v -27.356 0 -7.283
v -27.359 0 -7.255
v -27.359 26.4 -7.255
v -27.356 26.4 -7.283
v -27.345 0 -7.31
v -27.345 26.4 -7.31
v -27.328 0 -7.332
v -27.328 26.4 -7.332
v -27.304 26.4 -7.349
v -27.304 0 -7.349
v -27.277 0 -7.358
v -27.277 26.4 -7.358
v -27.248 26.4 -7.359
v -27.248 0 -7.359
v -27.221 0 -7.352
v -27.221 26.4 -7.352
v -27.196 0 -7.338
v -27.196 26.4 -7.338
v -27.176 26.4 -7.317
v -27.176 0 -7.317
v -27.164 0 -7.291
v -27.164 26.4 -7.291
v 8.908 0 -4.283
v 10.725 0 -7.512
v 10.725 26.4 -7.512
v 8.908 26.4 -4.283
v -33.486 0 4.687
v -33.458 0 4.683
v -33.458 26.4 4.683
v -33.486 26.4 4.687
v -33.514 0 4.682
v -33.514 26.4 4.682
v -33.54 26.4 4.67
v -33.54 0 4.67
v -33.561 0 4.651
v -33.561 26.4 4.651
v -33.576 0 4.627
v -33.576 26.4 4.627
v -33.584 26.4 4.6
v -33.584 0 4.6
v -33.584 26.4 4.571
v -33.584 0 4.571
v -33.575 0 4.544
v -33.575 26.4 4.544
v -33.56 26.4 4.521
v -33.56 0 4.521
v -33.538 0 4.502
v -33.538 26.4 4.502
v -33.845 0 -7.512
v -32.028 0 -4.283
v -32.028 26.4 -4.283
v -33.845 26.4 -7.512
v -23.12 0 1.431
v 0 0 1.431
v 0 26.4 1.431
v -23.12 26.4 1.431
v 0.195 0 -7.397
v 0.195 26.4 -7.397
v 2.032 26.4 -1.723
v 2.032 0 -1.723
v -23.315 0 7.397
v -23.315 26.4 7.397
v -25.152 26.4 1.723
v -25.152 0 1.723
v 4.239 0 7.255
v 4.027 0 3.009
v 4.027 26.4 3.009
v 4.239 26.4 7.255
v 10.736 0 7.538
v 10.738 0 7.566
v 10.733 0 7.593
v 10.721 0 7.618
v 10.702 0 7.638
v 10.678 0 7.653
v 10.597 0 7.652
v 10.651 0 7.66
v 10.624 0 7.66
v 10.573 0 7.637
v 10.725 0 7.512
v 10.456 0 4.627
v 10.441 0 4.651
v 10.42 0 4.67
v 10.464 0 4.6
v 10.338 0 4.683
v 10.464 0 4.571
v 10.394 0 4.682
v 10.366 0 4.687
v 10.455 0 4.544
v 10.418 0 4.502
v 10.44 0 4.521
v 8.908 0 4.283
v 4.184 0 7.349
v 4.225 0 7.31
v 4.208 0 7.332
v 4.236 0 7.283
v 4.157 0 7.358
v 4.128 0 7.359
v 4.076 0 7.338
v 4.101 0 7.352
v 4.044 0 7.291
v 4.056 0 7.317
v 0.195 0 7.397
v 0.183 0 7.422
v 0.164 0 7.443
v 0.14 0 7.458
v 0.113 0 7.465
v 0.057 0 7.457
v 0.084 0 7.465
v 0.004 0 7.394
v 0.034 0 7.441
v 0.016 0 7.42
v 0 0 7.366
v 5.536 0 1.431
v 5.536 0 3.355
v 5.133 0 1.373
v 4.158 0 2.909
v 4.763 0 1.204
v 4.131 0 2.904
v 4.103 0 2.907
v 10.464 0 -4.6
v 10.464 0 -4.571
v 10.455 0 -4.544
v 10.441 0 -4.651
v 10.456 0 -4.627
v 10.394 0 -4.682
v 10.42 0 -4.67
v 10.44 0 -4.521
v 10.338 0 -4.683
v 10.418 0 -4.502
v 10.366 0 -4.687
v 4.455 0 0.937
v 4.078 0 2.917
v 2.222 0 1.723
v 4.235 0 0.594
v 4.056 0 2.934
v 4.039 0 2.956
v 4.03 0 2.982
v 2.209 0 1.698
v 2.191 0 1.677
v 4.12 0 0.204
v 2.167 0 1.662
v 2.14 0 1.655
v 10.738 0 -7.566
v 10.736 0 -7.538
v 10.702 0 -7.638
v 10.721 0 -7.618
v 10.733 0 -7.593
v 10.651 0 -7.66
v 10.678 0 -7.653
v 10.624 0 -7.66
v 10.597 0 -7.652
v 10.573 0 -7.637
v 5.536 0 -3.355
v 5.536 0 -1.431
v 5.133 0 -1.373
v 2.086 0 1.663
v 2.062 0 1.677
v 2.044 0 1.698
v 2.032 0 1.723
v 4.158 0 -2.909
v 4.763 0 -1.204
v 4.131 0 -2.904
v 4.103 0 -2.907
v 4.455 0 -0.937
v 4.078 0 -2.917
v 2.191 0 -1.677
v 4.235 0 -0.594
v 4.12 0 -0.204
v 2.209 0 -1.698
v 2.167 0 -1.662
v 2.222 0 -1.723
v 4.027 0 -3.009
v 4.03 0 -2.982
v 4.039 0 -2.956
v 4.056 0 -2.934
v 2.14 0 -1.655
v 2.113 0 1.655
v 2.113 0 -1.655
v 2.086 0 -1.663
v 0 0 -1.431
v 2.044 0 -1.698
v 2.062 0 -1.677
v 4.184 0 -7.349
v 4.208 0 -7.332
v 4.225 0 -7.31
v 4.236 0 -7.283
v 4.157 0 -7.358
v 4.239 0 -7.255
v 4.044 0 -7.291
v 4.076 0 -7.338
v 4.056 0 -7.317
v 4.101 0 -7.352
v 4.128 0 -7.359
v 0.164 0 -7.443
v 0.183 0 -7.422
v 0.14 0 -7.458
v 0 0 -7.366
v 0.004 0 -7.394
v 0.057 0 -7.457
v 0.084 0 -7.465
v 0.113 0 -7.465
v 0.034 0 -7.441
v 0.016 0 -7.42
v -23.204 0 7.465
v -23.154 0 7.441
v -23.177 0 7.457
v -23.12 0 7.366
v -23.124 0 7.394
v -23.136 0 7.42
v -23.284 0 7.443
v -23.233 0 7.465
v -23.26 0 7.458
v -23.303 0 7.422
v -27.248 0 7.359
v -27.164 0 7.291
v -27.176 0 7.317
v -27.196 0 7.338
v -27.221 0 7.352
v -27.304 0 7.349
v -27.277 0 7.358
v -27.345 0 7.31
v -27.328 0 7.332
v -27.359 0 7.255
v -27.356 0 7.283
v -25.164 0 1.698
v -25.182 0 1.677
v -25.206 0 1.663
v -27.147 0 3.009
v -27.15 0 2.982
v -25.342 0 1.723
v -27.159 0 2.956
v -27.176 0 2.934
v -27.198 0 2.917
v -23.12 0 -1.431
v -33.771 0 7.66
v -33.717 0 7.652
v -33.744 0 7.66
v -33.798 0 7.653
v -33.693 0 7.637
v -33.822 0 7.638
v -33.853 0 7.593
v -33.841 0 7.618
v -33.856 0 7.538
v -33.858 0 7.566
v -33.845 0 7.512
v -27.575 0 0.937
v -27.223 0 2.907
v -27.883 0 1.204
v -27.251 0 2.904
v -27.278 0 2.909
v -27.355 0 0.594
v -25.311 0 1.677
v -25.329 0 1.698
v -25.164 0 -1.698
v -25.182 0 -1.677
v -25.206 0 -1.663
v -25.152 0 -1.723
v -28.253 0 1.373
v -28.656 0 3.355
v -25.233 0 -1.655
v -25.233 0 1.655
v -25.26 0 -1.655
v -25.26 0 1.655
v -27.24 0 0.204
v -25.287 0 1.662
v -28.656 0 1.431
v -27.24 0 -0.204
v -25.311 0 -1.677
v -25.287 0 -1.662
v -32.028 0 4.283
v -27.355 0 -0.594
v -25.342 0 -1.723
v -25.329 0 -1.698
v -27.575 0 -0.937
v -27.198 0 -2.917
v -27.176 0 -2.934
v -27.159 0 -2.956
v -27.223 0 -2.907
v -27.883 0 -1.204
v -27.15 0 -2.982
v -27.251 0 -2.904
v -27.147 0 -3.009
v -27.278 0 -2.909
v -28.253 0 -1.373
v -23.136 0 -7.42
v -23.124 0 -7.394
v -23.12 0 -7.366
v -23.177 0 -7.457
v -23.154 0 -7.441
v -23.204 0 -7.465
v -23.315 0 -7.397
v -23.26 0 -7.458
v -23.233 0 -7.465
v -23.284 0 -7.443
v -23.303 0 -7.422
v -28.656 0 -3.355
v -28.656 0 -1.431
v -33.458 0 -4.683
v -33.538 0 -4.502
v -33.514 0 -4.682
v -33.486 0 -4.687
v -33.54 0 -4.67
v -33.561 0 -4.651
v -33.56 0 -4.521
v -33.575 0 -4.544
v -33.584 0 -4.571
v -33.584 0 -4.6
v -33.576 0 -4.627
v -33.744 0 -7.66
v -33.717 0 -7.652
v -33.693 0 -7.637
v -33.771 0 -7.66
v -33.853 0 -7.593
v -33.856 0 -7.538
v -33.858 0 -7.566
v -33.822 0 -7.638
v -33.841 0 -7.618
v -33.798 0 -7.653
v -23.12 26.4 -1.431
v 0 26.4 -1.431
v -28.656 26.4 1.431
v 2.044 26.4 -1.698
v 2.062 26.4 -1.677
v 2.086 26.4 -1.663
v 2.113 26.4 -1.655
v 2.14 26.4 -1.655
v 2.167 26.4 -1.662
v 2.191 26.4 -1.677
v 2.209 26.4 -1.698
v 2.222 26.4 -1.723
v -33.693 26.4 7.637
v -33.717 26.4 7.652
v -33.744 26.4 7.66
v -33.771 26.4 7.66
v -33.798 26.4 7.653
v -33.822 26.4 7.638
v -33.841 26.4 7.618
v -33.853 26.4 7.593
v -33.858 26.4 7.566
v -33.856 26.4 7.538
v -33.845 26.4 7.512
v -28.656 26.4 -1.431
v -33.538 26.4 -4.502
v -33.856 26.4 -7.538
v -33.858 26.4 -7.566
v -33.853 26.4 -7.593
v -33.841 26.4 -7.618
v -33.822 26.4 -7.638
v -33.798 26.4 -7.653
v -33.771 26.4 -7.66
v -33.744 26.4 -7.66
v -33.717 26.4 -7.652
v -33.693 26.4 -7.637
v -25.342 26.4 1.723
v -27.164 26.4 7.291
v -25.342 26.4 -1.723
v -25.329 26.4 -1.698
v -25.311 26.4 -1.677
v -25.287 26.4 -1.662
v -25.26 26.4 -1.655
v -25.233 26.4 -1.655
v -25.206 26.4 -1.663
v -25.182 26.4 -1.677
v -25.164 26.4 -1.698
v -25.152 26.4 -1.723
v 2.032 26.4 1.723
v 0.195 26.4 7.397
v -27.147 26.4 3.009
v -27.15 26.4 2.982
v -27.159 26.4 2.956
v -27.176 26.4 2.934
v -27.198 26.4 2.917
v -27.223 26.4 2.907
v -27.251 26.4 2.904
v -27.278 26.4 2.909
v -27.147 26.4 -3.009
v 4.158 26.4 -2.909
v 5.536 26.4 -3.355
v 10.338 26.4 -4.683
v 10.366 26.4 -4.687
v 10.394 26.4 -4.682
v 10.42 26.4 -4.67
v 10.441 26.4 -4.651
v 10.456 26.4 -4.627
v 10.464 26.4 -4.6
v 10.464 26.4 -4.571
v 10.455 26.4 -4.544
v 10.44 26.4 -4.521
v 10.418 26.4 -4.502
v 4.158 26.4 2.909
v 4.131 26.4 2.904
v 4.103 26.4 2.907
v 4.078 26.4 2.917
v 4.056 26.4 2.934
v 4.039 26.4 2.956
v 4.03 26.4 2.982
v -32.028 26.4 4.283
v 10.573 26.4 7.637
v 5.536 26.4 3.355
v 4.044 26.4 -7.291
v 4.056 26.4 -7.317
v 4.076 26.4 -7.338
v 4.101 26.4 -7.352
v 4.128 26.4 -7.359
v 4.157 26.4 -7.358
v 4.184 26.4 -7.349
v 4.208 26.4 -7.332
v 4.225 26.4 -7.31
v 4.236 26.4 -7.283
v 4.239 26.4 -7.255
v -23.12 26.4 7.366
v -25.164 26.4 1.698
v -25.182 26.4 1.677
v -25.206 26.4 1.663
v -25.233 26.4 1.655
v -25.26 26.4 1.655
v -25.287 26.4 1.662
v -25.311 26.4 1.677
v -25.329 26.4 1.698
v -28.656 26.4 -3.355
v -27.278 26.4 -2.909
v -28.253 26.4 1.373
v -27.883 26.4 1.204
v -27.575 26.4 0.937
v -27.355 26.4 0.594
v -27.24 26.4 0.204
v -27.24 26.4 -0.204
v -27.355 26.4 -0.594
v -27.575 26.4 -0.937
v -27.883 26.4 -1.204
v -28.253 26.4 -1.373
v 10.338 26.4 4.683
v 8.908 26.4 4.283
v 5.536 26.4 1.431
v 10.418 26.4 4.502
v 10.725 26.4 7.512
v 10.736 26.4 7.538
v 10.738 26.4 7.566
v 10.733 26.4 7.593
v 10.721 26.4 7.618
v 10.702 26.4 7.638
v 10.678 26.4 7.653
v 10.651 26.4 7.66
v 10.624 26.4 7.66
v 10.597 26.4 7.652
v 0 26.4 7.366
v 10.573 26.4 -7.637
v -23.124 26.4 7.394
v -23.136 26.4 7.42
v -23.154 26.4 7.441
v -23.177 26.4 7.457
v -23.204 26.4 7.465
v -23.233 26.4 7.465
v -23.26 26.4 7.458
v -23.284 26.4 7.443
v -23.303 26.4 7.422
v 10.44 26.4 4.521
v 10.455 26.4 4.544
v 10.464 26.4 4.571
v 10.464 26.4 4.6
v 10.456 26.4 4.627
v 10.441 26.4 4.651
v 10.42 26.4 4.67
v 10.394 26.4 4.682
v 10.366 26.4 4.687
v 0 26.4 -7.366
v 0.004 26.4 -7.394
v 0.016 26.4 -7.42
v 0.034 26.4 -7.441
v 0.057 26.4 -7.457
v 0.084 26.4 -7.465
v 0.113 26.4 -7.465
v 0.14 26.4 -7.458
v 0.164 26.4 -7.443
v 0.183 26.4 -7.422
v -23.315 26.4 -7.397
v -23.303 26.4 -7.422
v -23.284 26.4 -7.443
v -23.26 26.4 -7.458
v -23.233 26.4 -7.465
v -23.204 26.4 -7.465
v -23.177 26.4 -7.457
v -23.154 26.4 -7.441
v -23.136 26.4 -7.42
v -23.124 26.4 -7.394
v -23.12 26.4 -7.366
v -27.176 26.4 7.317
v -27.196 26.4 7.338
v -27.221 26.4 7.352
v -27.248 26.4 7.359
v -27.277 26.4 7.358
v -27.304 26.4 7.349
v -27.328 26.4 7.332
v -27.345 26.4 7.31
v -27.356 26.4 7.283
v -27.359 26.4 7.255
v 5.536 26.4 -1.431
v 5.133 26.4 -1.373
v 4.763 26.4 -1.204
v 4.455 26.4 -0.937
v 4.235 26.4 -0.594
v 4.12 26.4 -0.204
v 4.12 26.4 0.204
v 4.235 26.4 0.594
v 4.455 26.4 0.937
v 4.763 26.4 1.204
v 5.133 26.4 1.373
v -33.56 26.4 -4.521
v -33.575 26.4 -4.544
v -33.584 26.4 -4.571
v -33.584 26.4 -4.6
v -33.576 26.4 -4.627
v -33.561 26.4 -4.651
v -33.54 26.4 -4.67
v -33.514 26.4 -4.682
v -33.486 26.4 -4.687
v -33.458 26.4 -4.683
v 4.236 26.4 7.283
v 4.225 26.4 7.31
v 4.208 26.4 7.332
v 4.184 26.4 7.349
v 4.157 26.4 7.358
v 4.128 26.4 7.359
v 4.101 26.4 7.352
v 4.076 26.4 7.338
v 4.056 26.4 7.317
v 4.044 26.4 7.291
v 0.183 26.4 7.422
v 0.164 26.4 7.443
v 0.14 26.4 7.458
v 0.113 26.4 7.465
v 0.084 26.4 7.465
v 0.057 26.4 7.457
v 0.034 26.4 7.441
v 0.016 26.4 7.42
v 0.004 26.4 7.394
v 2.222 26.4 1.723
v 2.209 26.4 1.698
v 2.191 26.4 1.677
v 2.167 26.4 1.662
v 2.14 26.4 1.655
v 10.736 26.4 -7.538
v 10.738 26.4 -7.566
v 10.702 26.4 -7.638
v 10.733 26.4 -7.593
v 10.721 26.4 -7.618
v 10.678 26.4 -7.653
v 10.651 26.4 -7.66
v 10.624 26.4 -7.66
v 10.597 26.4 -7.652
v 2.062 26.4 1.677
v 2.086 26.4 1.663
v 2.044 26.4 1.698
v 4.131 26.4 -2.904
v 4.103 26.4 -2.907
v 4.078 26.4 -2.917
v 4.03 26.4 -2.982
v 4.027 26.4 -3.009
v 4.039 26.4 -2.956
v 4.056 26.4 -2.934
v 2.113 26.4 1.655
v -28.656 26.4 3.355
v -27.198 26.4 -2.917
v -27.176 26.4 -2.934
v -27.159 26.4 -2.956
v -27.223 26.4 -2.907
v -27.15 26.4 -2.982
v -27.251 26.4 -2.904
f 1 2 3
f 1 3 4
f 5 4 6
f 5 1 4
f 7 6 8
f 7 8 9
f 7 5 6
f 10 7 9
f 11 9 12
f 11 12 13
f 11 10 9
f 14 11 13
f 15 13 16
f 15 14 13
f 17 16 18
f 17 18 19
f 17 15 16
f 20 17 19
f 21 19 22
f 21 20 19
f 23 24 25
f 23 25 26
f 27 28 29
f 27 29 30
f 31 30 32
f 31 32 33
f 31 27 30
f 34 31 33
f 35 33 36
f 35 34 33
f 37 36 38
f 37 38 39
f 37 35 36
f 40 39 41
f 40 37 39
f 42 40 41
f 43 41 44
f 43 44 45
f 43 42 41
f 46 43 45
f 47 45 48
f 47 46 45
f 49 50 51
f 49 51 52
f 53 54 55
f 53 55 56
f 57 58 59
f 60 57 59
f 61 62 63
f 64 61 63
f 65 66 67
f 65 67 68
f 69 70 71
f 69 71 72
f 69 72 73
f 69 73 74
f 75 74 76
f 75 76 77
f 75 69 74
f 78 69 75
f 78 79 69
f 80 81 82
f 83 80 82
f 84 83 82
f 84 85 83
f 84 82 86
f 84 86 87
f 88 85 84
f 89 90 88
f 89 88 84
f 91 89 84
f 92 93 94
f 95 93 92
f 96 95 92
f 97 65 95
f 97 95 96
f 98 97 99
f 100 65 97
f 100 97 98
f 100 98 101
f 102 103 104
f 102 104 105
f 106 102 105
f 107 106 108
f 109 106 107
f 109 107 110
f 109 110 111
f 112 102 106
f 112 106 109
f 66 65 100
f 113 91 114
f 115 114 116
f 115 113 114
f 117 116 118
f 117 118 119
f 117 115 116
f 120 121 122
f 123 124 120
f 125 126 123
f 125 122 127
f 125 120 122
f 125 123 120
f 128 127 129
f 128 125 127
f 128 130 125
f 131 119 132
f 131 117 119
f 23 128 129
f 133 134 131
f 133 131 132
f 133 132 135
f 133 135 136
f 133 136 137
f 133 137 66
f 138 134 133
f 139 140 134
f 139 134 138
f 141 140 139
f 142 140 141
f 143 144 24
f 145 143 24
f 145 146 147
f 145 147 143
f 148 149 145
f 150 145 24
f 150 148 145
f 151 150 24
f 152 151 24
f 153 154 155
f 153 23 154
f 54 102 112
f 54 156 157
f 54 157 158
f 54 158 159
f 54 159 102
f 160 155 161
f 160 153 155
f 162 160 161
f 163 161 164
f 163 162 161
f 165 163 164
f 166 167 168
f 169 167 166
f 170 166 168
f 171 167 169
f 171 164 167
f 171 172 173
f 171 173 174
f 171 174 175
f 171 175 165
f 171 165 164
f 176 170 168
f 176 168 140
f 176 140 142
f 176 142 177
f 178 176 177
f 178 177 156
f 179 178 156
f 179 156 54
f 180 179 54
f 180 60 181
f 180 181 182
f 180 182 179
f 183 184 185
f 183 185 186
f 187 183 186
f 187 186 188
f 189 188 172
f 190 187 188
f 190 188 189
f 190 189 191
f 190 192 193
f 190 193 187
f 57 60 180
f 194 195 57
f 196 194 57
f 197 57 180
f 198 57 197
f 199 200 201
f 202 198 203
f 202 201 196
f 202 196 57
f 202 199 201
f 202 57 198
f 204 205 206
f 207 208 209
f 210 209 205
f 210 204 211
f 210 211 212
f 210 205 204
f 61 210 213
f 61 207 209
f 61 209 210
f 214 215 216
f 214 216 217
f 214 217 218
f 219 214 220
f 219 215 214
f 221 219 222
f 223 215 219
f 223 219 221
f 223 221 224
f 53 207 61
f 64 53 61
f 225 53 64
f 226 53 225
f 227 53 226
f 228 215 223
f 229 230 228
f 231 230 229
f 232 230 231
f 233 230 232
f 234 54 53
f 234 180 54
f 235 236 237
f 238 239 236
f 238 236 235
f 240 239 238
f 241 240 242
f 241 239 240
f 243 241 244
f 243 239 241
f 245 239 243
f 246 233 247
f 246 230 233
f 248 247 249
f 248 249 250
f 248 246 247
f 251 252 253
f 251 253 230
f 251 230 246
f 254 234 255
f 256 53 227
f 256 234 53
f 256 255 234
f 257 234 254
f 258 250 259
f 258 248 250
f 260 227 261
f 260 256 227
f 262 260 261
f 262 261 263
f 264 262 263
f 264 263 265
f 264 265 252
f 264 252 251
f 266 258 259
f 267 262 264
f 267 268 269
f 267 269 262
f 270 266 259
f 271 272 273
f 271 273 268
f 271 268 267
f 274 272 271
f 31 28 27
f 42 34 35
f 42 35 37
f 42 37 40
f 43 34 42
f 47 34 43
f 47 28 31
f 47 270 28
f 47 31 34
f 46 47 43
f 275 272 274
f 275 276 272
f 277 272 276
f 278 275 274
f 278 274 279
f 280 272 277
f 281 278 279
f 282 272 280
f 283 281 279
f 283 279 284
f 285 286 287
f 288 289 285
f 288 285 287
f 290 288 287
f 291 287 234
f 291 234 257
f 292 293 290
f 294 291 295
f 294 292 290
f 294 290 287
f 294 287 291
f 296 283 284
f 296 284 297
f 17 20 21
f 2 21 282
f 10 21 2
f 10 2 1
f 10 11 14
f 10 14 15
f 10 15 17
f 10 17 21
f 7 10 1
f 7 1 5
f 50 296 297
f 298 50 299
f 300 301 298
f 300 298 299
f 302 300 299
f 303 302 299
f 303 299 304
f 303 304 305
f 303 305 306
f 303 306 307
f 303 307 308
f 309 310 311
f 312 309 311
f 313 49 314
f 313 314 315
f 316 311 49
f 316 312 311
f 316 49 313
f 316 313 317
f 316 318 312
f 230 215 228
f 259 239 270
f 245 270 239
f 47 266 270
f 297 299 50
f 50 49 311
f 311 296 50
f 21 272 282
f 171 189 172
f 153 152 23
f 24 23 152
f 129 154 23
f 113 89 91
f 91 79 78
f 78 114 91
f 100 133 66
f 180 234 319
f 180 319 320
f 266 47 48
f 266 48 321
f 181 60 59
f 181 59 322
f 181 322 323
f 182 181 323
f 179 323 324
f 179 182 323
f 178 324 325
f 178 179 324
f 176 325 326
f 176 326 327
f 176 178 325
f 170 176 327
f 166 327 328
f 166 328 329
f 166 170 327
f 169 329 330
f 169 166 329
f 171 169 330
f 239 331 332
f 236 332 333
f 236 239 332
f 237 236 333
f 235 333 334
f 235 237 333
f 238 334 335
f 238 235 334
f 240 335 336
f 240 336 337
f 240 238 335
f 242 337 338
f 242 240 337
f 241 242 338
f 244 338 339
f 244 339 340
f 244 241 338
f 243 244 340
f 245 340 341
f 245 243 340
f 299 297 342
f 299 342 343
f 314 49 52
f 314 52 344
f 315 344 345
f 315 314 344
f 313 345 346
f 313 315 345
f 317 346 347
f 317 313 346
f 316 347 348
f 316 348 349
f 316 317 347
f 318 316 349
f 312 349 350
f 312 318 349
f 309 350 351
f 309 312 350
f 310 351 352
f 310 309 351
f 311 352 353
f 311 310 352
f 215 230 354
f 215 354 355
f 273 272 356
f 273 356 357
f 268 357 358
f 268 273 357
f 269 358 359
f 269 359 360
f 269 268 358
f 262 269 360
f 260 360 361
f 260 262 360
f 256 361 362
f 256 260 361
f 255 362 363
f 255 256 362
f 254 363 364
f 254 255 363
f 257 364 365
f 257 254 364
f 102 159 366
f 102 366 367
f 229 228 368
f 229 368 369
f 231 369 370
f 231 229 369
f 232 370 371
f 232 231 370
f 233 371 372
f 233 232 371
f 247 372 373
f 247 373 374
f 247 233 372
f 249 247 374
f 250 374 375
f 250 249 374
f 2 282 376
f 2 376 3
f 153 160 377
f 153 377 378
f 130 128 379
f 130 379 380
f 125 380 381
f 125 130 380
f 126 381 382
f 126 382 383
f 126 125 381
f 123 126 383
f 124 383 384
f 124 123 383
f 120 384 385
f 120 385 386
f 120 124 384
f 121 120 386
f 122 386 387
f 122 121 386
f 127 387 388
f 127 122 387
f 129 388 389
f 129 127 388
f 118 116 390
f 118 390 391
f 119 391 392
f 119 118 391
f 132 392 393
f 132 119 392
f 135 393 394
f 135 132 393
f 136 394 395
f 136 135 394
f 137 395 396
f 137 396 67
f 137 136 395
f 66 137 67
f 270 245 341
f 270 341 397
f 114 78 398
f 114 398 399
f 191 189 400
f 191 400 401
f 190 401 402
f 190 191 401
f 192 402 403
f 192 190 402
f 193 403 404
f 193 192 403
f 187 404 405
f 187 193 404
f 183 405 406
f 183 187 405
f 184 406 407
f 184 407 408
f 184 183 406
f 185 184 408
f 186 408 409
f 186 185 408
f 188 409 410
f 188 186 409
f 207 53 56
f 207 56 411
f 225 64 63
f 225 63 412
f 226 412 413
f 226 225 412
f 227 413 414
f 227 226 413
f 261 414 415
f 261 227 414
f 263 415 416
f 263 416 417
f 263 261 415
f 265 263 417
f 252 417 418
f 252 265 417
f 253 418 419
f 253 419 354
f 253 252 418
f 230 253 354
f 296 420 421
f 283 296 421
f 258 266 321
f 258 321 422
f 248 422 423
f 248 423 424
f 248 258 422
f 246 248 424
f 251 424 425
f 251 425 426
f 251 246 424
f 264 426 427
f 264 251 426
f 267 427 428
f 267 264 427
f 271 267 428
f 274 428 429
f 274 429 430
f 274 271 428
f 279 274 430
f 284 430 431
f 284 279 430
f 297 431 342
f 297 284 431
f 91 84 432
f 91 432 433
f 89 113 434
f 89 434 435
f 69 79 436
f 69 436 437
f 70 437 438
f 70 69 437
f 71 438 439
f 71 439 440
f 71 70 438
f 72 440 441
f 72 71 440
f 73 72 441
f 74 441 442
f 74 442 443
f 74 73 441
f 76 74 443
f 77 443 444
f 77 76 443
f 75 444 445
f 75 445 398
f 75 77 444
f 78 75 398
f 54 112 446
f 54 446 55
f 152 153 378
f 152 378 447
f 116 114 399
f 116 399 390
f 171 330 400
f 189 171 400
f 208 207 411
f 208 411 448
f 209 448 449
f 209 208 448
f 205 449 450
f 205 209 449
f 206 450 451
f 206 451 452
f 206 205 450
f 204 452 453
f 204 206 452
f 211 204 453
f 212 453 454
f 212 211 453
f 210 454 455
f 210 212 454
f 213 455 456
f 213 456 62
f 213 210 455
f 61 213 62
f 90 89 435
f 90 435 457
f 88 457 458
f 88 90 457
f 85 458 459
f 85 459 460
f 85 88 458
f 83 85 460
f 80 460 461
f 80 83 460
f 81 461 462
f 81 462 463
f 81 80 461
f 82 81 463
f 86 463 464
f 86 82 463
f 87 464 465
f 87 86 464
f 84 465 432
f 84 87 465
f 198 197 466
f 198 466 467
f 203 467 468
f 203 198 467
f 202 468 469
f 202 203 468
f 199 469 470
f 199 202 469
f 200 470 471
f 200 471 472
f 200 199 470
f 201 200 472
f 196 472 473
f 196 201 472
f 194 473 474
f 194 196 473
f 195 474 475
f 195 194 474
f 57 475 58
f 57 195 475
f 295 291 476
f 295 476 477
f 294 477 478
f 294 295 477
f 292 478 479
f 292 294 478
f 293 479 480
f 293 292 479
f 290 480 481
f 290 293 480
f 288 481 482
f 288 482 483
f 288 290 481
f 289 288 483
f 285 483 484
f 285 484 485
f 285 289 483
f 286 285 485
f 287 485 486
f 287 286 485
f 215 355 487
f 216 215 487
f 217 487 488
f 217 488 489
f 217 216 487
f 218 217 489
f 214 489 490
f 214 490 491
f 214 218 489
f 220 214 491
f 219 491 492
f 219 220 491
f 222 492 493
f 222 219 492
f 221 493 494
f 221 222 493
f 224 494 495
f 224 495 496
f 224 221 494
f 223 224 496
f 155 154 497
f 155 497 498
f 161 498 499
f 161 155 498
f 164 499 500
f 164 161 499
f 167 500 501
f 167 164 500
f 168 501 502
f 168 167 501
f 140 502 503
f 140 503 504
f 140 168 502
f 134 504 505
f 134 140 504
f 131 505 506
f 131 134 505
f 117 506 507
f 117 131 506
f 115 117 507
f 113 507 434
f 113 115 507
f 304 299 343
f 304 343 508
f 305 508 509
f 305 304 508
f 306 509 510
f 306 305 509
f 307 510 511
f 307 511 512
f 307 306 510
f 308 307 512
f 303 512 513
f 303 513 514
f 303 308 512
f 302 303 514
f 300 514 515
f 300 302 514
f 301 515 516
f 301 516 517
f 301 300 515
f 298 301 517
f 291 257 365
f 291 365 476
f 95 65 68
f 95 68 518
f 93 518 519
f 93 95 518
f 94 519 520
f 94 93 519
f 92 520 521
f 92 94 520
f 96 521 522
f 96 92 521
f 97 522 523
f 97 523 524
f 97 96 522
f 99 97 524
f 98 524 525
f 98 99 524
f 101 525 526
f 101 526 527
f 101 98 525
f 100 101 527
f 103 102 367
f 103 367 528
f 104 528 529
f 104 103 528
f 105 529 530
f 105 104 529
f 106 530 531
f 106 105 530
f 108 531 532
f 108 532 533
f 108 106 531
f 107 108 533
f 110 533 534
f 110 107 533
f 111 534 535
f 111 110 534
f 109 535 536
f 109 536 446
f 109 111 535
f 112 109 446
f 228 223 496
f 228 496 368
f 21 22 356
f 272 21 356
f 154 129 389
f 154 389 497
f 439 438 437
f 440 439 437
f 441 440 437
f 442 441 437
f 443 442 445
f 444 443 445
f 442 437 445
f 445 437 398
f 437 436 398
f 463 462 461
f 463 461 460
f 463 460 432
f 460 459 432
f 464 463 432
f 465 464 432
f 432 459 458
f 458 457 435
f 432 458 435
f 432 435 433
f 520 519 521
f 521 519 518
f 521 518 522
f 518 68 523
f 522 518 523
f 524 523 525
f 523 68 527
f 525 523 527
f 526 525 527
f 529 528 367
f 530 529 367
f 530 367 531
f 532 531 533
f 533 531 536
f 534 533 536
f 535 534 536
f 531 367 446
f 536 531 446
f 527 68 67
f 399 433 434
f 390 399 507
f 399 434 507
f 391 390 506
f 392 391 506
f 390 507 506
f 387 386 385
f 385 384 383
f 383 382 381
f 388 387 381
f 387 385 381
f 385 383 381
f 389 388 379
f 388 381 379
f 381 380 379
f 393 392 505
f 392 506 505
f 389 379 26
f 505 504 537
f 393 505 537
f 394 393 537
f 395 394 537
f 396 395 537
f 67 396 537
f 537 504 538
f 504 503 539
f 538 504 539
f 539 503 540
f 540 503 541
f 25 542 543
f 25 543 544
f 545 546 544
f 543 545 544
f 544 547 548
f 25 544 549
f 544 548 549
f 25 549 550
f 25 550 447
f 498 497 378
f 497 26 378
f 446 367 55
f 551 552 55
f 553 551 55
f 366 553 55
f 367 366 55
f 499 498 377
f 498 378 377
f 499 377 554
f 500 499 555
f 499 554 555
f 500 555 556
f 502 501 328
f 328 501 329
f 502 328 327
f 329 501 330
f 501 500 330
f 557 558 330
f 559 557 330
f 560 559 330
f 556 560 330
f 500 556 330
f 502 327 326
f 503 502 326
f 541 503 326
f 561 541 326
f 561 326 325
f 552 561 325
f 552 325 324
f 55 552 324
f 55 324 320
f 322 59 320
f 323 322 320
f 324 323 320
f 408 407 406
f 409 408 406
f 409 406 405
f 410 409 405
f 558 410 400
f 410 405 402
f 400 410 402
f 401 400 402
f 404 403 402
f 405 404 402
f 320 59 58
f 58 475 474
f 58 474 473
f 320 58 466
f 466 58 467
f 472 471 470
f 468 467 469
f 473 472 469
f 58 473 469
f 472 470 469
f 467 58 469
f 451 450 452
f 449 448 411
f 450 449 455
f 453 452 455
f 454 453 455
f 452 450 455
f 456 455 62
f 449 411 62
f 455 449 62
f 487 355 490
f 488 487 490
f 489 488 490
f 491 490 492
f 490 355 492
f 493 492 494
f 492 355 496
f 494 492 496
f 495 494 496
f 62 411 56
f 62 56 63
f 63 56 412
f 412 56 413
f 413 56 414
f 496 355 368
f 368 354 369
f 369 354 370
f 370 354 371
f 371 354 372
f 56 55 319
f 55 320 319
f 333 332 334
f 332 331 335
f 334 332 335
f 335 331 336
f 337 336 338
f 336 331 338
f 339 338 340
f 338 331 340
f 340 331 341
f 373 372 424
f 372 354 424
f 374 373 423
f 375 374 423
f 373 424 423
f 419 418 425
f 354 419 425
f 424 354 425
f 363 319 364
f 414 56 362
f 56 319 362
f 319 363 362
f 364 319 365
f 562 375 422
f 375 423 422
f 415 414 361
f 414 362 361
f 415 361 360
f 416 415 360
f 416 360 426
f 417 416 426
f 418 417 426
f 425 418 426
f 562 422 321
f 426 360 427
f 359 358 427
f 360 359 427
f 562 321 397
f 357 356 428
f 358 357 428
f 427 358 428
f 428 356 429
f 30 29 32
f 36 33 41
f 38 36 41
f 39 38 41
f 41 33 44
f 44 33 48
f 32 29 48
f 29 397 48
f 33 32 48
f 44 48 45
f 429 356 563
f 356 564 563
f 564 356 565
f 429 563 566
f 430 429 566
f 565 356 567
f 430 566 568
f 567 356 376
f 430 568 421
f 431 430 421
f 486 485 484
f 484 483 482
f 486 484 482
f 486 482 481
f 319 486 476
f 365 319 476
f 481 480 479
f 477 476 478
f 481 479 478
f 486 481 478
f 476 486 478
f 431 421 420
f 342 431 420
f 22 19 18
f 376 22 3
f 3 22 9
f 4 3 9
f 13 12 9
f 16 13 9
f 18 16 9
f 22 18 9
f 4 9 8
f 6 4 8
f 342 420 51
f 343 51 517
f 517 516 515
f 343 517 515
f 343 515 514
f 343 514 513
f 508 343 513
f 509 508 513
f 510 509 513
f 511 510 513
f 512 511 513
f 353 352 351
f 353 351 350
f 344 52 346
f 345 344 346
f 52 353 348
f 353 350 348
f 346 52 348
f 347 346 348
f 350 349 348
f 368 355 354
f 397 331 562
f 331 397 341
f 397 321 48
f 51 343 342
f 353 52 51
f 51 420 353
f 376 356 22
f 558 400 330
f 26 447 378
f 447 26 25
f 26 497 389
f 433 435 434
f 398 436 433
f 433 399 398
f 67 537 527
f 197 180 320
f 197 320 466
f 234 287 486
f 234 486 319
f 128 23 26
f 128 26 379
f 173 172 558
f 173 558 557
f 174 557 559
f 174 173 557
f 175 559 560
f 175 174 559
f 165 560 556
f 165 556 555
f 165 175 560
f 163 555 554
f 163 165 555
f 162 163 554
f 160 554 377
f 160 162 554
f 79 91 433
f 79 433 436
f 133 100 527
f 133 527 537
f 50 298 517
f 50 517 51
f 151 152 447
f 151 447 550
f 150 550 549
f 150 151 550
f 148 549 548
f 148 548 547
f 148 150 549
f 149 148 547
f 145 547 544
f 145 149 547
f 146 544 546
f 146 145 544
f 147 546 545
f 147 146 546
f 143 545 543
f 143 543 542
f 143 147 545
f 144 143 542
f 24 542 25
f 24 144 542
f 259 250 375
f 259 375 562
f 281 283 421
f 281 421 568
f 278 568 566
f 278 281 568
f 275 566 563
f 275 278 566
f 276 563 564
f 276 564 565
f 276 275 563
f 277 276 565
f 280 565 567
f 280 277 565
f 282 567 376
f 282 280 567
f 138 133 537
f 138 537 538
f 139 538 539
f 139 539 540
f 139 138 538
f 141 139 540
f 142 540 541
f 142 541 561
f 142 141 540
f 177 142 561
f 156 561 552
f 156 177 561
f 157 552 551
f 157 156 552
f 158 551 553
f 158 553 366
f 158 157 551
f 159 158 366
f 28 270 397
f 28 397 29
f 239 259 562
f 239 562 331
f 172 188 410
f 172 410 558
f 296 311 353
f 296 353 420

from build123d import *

# Parameters (mm, degrees)
EXTRUDE_1_DEPTH = 26.4


with BuildPart() as part:
    # Эскиз1 → Бобышка-Вытянуть1 (new body)
    with BuildSketch(Plane(origin=(0, 0, 0), x_dir=(1, 0, 0), z_dir=(0, 1, 0))):
        with BuildLine():
            Line((0, -7.366273292), (0, -1.430737225))
            Line((0, -1.430737225), (-23.119998808, -1.430737225))
            Line((-23.119998808, -1.430737225), (-23.119998808, -7.366273292))
            ThreePointArc((-23.119998808, -7.366273292), (-23.204411997, -7.465051079), (-23.315139834, -7.397065907))
            Line((-23.315139834, -7.397065907), (-25.151536602, -1.723086212))
            ThreePointArc((-25.151536602, -1.723086212), (-25.246516215, -1.653878958), (-25.341718752, -1.722779233))
            Line((-25.341718752, -1.722779233), (-27.163713043, -7.290838427))
            ThreePointArc((-27.163713043, -7.290838427), (-27.276953731, -7.358068766), (-27.358630238, -7.254761845))
            Line((-27.358630238, -7.254761845), (-27.147073457, -3.009330281))
            ThreePointArc((-27.147073457, -3.009330281), (-27.186129834, -2.924974677), (-27.277742143, -2.909212268))
            Line((-27.277742143, -2.909212268), (-28.656433819, -3.355429045))
            Line((-28.656433819, -3.355429045), (-33.693480219, -7.637416988))
            ThreePointArc((-33.693480219, -7.637416988), (-33.821863766, -7.638385786), (-33.84539196, -7.51217288))
            Line((-33.84539196, -7.51217288), (-32.027666378, -4.283069467))
            Line((-32.027666378, -4.283069467), (-33.457933536, -4.683052776))
            ThreePointArc((-33.457933536, -4.683052776), (-33.57629105, -4.627262362), (-33.538118808, -4.502106653))
            Line((-33.538118808, -4.502106653), (-28.656434415, -1.430737225))
            ThreePointArc((-28.656434415, -1.430737225), (-27.22569719, 0), (-28.656434415, 1.430737225))
            Line((-28.656434415, 1.430737225), (-33.538118808, 4.502106653))
            ThreePointArc((-33.538118808, 4.502106653), (-33.57629105, 4.627262362), (-33.457933536, 4.683052776))
            Line((-33.457933536, 4.683052776), (-32.027666378, 4.283069467))
            Line((-32.027666378, 4.283069467), (-33.84539196, 7.51217288))
            ThreePointArc((-33.84539196, 7.51217288), (-33.821862569, 7.638384319), (-33.693480241, 7.637416132))
            Line((-33.693480241, 7.637416132), (-28.656433494, 3.355428597))
            Line((-28.656433494, 3.355428597), (-27.277741782, 2.909211931))
            ThreePointArc((-27.277741782, 2.909211931), (-27.186129475, 2.924974348), (-27.147073104, 3.009329955))
            Line((-27.147073104, 3.009329955), (-27.358630229, 7.254761502))
            ThreePointArc((-27.358630229, 7.254761502), (-27.27695373, 7.35806843), (-27.163713037, 7.2908381))
            Line((-27.163713037, 7.2908381), (-25.341718295, 1.722779053))
            ThreePointArc((-25.341718295, 1.722779053), (-25.246515752, 1.653878786), (-25.151536145, 1.723086048))
            Line((-25.151536145, 1.723086048), (-23.315139837, 7.397065891))
            ThreePointArc((-23.315139837, 7.397065891), (-23.204412005, 7.465051072), (-23.119998808, 7.366273292))
            Line((-23.119998808, 7.366273292), (-23.119998808, 1.430737225))
            Line((-23.119998808, 1.430737225), (0, 1.430737225))
            Line((0, 1.430737225), (0, 7.366273292))
            ThreePointArc((0, 7.366273292), (0.084413196, 7.465051072), (0.195141029, 7.397065891))
            Line((0.195141029, 7.397065891), (2.031537337, 1.723086048))
            ThreePointArc((2.031537337, 1.723086048), (2.126516944, 1.653878786), (2.221719487, 1.722779053))
            Line((2.221719487, 1.722779053), (4.043714229, 7.2908381))
            ThreePointArc((4.043714229, 7.2908381), (4.156954922, 7.35806843), (4.238631421, 7.254761502))
            Line((4.238631421, 7.254761502), (4.027074296, 3.009329955))
            ThreePointArc((4.027074296, 3.009329955), (4.066130667, 2.924974348), (4.157742974, 2.909211931))
            Line((4.157742974, 2.909211931), (5.536434686, 3.355428597))
            Line((5.536434686, 3.355428597), (10.573481433, 7.637416132))
            ThreePointArc((10.573481433, 7.637416132), (10.701863761, 7.638384319), (10.725393152, 7.51217288))
            Line((10.725393152, 7.51217288), (8.90766757, 4.283069467))
            Line((8.90766757, 4.283069467), (10.337934728, 4.683052776))
            ThreePointArc((10.337934728, 4.683052776), (10.456292242, 4.627262362), (10.41812, 4.502106653))
            Line((10.41812, 4.502106653), (5.536435606, 1.430737225))
            ThreePointArc((5.536435606, 1.430737225), (4.105698382, 0), (5.536435606, -1.430737225))
            Line((5.536435606, -1.430737225), (10.41812, -4.502106653))
            ThreePointArc((10.41812, -4.502106653), (10.456292242, -4.627262362), (10.337934728, -4.683052776))
            Line((10.337934728, -4.683052776), (8.90766757, -4.283069467))
            Line((8.90766757, -4.283069467), (10.725393152, -7.51217288))
            ThreePointArc((10.725393152, -7.51217288), (10.701864958, -7.638385786), (10.573481411, -7.637416988))
            Line((10.573481411, -7.637416988), (5.536435011, -3.355429045))
            Line((5.536435011, -3.355429045), (4.157743335, -2.909212268))
            ThreePointArc((4.157743335, -2.909212268), (4.066131026, -2.924974677), (4.027074648, -3.009330281))
            Line((4.027074648, -3.009330281), (4.23863143, -7.254761845))
            ThreePointArc((4.23863143, -7.254761845), (4.156954922, -7.358068766), (4.043714235, -7.290838427))
            Line((4.043714235, -7.290838427), (2.221719944, -1.722779233))
            ThreePointArc((2.221719944, -1.722779233), (2.126517406, -1.653878958), (2.031537794, -1.723086212))
            Line((2.031537794, -1.723086212), (0.195141026, -7.397065907))
            ThreePointArc((0.195141026, -7.397065907), (0.084413188, -7.465051079), (0, -7.366273292))
        make_face()
    extrude(amount=EXTRUDE_1_DEPTH)


solid = part.part
